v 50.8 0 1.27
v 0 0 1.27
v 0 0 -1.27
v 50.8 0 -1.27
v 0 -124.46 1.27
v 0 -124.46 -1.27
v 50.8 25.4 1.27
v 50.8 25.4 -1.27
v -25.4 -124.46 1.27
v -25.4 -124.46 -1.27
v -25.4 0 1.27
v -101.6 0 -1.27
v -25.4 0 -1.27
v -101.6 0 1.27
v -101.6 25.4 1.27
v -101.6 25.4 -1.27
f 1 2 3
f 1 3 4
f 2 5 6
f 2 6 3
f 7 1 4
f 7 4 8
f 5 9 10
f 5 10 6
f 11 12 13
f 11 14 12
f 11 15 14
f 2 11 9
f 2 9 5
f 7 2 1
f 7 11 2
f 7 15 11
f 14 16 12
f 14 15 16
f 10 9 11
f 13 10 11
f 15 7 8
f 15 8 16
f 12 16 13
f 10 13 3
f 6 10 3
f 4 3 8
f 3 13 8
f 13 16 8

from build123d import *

# Parameters (mm, degrees)
SKETCH1_W           = 25.4
SKETCH1_H           = 124.46
BOSS_EXTRUDE1_DEPTH = 1.27


with BuildPart() as part:
    # Sketch1 → Boss-Extrude1 (new, symmetric)
    with BuildSketch(Plane.XY):
        with Locations((-12.7, -62.23)):
            Rectangle(SKETCH1_W, SKETCH1_H)
        Polygon((50.8, 25.4), (-101.6, 25.4), (-101.6, 0), (-25.4, 0), (0, 0), (50.8, 0), align=None)
    extrude(amount=BOSS_EXTRUDE1_DEPTH, both=True)


solid = part.part
